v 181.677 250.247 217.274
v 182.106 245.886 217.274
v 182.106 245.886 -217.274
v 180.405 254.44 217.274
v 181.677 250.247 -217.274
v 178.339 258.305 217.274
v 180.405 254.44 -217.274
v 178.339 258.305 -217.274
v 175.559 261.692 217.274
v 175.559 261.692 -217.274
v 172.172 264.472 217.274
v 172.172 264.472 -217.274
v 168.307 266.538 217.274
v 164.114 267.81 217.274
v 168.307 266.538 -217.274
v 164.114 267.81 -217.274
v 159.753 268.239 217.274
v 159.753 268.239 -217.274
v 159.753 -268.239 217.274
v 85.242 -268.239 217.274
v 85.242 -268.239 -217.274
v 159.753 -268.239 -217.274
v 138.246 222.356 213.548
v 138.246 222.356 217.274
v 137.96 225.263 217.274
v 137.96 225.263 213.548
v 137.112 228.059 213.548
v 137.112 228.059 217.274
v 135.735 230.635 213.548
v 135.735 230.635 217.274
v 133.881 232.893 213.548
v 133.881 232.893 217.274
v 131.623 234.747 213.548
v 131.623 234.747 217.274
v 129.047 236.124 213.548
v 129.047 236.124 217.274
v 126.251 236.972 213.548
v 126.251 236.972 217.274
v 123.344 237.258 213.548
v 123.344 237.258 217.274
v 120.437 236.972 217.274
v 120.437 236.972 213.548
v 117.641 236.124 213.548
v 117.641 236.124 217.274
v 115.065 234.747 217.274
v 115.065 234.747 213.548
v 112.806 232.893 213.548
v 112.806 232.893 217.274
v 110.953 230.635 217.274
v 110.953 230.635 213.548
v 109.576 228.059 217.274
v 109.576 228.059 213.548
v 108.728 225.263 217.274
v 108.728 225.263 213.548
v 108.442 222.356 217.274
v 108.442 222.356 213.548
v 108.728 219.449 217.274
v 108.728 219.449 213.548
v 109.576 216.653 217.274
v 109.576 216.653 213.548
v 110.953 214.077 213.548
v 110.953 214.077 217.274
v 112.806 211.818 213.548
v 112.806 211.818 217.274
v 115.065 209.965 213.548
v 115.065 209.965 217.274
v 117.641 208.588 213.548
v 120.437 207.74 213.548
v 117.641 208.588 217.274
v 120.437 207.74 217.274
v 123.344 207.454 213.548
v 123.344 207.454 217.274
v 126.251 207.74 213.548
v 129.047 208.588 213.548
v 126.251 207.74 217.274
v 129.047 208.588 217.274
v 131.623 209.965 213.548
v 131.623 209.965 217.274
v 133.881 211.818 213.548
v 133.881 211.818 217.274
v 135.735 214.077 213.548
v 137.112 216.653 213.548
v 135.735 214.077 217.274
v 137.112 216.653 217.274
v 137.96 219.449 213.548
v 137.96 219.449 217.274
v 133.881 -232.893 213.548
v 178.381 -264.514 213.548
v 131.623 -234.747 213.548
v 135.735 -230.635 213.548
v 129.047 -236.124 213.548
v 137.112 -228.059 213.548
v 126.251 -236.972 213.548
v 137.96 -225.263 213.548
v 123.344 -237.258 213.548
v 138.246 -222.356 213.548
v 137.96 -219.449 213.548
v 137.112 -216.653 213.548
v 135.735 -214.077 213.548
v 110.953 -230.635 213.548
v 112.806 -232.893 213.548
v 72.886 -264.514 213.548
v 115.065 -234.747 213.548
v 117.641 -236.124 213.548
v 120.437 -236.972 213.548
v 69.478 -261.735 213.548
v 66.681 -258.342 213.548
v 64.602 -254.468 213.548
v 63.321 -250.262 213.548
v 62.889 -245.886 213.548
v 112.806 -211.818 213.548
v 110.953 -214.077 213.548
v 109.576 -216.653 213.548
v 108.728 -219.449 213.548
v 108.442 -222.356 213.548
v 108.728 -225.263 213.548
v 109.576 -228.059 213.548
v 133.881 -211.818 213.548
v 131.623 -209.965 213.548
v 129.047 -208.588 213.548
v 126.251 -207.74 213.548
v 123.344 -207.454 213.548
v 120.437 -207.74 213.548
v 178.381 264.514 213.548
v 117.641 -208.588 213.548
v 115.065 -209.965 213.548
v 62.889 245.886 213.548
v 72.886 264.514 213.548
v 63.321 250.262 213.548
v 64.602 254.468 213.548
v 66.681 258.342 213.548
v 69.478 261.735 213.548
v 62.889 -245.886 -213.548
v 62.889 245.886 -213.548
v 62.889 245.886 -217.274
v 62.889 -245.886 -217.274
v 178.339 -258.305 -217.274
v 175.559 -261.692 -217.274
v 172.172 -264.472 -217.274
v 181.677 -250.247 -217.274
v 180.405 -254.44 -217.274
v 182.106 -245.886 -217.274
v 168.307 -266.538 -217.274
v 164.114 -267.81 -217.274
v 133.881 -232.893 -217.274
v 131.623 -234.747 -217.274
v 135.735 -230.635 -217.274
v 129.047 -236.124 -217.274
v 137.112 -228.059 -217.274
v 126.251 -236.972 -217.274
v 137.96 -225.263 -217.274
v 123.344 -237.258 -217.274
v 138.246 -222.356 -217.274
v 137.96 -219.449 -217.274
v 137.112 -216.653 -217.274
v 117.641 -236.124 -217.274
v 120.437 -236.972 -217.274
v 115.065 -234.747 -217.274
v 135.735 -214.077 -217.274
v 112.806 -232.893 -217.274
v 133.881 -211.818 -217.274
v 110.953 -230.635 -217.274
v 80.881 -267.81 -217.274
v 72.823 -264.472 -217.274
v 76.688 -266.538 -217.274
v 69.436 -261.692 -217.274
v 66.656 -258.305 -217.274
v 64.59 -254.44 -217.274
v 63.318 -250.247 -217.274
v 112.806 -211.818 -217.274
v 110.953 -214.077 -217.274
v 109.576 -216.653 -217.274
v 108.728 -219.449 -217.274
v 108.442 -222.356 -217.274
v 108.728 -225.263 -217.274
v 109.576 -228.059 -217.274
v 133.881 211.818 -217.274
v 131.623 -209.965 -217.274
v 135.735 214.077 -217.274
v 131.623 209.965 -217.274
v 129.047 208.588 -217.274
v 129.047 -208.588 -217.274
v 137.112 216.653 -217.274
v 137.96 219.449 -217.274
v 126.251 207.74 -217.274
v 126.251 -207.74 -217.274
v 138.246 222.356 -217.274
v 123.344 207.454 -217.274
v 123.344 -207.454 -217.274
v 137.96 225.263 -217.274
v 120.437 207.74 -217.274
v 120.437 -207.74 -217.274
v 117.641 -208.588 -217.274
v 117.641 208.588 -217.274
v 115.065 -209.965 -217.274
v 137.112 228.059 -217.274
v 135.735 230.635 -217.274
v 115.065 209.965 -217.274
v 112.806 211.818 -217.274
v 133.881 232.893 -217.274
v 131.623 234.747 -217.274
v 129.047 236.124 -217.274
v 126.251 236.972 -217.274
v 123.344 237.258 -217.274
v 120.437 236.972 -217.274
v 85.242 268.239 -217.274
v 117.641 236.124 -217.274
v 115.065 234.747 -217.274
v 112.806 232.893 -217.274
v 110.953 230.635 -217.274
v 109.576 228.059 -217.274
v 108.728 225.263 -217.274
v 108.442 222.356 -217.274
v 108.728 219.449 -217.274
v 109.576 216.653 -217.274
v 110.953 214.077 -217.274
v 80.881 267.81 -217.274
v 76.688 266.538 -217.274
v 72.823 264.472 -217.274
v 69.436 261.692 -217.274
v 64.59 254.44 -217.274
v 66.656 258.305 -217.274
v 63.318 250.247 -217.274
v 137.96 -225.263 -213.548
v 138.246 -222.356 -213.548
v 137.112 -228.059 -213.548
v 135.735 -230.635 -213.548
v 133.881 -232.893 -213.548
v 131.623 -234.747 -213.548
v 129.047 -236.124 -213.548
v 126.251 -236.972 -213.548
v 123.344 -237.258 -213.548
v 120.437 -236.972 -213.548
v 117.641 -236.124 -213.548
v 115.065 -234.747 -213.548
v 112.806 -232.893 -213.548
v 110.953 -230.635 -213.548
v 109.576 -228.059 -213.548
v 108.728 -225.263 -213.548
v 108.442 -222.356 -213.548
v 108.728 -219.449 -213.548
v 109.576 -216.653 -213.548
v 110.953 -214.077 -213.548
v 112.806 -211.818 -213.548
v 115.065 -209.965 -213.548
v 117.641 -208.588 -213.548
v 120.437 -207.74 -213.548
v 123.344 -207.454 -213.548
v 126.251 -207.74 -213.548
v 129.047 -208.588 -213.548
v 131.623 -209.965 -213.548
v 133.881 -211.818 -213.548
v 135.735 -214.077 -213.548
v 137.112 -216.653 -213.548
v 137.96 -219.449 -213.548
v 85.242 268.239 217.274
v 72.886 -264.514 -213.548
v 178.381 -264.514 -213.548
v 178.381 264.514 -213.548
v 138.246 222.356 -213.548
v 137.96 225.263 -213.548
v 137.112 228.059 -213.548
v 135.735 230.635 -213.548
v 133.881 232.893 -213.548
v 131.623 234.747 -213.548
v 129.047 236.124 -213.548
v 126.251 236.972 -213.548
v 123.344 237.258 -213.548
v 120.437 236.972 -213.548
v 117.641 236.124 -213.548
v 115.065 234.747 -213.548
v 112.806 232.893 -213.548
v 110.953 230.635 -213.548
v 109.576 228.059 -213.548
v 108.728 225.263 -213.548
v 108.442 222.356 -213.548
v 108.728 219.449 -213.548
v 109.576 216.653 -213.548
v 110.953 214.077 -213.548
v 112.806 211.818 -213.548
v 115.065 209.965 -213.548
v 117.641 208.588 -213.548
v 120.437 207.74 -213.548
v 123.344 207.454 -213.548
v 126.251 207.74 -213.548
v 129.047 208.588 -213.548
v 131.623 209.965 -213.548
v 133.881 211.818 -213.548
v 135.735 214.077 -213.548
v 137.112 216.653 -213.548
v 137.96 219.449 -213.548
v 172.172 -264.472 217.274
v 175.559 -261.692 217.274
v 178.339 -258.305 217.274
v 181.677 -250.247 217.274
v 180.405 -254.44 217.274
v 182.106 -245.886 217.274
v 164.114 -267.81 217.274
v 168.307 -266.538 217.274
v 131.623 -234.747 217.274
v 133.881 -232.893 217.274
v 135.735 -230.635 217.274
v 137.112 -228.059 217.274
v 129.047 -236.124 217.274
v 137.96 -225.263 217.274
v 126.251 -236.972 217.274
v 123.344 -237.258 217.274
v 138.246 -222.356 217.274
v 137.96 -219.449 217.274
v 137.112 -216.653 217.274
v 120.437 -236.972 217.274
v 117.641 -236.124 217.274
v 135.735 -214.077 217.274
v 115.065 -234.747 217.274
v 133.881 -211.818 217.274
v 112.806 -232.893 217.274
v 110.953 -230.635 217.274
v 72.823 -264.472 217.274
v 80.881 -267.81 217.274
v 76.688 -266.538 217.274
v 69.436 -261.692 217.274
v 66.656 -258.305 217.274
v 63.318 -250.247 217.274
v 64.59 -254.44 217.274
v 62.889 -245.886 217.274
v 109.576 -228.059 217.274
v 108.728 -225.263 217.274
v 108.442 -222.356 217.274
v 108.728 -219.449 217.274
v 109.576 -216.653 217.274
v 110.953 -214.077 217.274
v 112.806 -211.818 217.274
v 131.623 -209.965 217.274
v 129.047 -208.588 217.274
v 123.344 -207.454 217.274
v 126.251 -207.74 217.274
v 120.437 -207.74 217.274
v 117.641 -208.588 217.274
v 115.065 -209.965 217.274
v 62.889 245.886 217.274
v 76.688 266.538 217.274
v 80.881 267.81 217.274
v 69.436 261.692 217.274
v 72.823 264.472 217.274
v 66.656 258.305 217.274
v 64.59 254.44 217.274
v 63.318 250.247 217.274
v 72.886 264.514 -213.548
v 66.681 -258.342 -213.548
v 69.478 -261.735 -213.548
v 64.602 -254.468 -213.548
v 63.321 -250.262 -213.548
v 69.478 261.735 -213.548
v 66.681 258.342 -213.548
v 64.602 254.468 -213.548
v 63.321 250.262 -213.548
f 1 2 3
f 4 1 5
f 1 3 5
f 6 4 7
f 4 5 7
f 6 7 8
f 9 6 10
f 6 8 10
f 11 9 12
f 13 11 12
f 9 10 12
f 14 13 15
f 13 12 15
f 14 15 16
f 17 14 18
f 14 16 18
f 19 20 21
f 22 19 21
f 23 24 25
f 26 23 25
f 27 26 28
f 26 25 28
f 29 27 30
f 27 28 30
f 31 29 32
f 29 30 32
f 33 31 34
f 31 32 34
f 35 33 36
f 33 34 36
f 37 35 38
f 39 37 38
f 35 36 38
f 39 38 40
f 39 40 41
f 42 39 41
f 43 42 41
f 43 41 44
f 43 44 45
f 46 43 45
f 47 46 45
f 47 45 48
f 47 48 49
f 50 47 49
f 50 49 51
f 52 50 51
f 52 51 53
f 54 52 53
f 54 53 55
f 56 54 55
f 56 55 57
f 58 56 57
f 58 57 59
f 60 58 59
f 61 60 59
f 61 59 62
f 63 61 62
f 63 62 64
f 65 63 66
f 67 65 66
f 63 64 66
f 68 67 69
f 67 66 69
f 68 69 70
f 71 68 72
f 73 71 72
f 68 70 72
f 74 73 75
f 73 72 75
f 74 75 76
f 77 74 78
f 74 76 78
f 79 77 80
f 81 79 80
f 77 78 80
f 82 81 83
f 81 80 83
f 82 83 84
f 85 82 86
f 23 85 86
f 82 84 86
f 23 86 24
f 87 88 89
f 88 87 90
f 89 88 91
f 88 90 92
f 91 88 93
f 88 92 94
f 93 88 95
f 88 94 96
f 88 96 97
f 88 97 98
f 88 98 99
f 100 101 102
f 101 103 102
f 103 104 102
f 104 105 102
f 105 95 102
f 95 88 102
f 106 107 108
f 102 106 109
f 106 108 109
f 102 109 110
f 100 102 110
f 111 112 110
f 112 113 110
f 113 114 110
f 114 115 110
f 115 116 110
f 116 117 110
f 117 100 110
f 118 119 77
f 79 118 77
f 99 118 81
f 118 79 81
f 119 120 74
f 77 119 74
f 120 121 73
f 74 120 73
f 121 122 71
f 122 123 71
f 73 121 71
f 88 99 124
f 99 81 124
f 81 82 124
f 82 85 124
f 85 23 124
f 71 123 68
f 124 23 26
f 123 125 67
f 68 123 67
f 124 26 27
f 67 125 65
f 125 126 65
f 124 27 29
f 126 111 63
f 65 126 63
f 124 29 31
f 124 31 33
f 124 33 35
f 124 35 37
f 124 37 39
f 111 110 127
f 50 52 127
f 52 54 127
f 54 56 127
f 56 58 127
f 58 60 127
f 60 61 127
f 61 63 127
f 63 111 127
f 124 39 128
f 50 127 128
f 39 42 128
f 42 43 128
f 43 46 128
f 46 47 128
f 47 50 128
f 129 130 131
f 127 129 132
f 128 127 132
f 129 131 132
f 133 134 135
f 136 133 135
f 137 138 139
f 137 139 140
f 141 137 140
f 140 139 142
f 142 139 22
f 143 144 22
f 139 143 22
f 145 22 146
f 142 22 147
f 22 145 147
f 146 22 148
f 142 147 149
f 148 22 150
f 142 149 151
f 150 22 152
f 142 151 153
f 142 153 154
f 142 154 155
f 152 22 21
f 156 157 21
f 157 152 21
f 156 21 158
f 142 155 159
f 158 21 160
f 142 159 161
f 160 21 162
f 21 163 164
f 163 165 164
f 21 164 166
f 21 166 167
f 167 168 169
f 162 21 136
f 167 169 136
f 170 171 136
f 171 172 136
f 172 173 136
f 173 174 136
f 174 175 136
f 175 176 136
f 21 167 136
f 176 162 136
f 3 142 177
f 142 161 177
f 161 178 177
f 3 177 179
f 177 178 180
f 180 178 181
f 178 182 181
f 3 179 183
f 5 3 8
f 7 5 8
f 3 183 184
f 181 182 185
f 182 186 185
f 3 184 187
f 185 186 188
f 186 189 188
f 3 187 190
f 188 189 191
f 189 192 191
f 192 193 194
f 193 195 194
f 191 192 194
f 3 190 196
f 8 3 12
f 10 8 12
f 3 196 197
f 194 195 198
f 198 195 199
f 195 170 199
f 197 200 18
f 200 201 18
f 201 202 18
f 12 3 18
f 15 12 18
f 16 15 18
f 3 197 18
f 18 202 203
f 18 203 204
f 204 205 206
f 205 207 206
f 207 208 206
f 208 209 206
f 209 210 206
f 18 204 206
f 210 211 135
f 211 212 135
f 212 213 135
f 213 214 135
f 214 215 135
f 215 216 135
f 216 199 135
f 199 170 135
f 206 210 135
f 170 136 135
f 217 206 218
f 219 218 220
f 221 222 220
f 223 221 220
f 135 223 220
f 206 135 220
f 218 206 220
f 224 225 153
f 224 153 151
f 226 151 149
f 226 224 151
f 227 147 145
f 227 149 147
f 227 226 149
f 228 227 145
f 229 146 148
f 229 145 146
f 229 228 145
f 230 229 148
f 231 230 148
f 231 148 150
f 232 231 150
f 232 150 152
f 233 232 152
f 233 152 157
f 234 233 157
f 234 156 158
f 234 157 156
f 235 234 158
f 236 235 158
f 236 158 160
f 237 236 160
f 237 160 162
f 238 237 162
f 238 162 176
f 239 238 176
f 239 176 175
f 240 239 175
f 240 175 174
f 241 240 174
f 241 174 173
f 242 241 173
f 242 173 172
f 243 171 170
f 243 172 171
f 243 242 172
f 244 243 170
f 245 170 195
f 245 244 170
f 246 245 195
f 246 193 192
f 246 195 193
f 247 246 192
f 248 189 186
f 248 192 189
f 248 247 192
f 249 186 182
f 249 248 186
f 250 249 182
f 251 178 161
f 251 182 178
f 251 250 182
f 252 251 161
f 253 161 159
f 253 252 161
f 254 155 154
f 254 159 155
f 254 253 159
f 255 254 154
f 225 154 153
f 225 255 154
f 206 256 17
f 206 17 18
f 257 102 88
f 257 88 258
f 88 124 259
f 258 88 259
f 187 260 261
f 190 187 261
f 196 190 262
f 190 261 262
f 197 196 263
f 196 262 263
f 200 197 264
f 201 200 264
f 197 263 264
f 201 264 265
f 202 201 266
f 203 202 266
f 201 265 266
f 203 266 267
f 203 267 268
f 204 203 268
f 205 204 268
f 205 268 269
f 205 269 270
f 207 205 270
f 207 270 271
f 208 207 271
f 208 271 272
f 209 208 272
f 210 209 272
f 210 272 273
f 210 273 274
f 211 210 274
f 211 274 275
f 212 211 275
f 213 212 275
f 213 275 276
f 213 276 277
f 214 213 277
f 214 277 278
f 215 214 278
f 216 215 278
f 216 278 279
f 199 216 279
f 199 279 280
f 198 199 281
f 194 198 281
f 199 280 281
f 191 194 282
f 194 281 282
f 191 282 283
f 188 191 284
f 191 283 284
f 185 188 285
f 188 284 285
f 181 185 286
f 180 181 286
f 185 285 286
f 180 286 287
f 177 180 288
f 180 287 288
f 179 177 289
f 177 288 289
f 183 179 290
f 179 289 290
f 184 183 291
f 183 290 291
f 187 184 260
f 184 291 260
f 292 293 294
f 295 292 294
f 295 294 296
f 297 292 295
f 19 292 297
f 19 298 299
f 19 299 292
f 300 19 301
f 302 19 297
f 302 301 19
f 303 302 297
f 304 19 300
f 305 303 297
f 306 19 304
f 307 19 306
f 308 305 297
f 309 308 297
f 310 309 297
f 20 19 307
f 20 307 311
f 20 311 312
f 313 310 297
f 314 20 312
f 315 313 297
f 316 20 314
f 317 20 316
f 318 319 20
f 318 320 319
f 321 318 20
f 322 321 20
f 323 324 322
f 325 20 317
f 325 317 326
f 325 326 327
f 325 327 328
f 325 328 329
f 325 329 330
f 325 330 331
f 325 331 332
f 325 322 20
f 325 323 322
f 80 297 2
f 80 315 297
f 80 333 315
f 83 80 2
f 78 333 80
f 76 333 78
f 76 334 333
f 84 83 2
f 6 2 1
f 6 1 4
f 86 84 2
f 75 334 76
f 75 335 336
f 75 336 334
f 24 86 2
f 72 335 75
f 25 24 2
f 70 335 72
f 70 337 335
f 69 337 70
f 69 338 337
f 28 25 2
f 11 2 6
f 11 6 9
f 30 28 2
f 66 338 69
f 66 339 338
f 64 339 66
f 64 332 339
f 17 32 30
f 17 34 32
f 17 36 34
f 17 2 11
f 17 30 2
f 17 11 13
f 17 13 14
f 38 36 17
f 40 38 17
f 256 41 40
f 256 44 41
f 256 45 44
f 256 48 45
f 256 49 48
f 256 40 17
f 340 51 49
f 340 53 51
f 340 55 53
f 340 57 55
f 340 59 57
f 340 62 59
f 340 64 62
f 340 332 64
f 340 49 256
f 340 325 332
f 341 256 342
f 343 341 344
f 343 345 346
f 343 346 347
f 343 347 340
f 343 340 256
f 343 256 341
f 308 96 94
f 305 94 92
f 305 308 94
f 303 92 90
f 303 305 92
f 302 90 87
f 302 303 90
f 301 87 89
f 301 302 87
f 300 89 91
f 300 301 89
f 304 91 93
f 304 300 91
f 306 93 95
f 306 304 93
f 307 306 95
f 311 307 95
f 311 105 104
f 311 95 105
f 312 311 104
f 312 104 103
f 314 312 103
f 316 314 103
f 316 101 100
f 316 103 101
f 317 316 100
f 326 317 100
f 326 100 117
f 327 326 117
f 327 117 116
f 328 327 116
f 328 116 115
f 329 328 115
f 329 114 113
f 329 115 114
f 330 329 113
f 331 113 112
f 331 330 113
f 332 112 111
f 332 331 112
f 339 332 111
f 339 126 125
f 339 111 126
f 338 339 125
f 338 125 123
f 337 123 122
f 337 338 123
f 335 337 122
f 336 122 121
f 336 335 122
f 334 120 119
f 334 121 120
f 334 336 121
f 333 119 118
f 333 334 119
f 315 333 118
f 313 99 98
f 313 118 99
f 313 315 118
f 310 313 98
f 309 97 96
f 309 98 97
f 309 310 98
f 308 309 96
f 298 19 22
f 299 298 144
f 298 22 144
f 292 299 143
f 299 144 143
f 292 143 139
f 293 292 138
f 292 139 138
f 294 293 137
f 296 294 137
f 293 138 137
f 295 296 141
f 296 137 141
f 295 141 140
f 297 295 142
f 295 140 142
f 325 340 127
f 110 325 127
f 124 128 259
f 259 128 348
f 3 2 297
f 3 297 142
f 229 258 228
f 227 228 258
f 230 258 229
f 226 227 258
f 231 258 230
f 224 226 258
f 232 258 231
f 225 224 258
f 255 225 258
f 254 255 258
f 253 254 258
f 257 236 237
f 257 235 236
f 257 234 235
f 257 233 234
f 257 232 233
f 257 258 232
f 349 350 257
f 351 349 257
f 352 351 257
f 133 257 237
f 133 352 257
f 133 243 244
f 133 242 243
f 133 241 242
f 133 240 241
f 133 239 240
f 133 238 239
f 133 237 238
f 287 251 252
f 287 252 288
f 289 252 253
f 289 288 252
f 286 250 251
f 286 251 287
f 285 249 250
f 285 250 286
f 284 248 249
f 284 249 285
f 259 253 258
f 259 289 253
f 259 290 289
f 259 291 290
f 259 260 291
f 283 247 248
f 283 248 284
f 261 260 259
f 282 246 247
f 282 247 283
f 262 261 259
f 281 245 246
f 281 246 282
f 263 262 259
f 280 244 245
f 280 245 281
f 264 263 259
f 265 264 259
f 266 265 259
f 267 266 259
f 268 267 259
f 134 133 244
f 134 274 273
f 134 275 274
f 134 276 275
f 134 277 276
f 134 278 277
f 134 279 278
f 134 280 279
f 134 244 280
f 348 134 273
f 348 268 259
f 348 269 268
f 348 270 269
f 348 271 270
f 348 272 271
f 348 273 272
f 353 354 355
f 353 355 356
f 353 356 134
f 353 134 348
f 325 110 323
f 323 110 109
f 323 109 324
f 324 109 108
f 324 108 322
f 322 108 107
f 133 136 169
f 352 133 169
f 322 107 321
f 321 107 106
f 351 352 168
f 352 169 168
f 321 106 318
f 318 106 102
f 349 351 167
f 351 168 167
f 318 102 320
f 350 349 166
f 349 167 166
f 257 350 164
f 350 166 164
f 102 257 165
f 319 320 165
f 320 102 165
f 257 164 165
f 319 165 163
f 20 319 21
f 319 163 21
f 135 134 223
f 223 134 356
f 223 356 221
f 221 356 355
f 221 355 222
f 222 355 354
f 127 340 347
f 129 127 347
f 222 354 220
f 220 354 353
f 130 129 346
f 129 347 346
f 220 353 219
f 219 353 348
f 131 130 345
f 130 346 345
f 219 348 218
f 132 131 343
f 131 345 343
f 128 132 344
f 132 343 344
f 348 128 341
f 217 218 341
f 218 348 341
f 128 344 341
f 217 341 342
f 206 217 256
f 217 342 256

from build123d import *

# Parameters (mm, degrees)
SKETCH1_W           = 740.664
SKETCH1_H           = 914.4
BOSS_EXTRUDE1_DEPTH = 203.2
SHELL1_T            = -6.35
SKETCH4_R           = 25.4
CUT_EXTRUDE1_DEPTH  = 853.694
FILLET1_R           = 38.1
SCALE1_SCALE        = 0.5867


with BuildPart() as part:
    # Sketch1 → Boss-Extrude1 (new body)
    with BuildSketch(Plane(origin=(0, 0, 0), x_dir=(0, 0, -1), z_dir=(1, 0, 0))):
        Rectangle(SKETCH1_W, SKETCH1_H)
    extrude(amount=BOSS_EXTRUDE1_DEPTH)

    # Shell1
    shell1_openings = [part.faces().sort_by_distance(p)[0] for p in [
        (0, 0, 0),
    ]]
    offset(amount=SHELL1_T, openings=shell1_openings, kind=Kind.INTERSECTION)

    # Sketch4 → Cut-Extrude1 (cut)
    with BuildSketch(Plane.XY.offset(370.332)):
        with Locations((103.042772695, 378.994204807)):
            Circle(SKETCH4_R)
    cut_extrude1 = extrude(amount=-CUT_EXTRUDE1_DEPTH, mode=Mode.SUBTRACT)

    # Mirror1: Cut-Extrude1 across plane
    add(cut_extrude1.mirror(Plane.ZX), mode=Mode.SUBTRACT)

    # Fillet1
    fillet1_edges = [part.edges().sort_by_distance(p)[0] for p in [
        (203.2, -457.2, 0),
    ]]
    fillet(fillet1_edges, radius=FILLET1_R)
    fillet1_2_edges = [part.edges().sort_by_distance(p)[0] for p in [
        (203.2, 457.2, 0),
    ]]
    fillet(fillet1_2_edges, radius=FILLET1_R)
    # the kernel refuses this fillet: 38.1 mm, written as the material it takes off along each edge
    with BuildSketch(Plane(origin=(0, -457.2, -465.582), x_dir=(1, 0, 0), z_dir=(0, 0, 1))) as fillet1_3_piece_1:
        with BuildLine():
            CenterArc((FILLET1_R, FILLET1_R), FILLET1_R, 180, 90)
            Line((0, FILLET1_R), (-FILLET1_R * 0.02, FILLET1_R))
            Line((-FILLET1_R * 0.02, FILLET1_R), (-FILLET1_R * 0.02, -FILLET1_R * 0.02))
            Line((-FILLET1_R * 0.02, -FILLET1_R * 0.02), (FILLET1_R, -FILLET1_R * 0.02))
            Line((FILLET1_R, -FILLET1_R * 0.02), (FILLET1_R, 0))
        make_face()
    extrude(amount=931.164, mode=Mode.SUBTRACT)
    # the kernel refuses this fillet: 38.1 mm, written as the material it takes off along each edge
    with BuildSketch(Plane(origin=(0, 457.2, 465.582), x_dir=(1, 0, 0), z_dir=(0, 0, -1))) as fillet1_4_piece_1:
        with BuildLine():
            CenterArc((FILLET1_R, FILLET1_R), FILLET1_R, 180, 90)
            Line((0, FILLET1_R), (-FILLET1_R * 0.02, FILLET1_R))
            Line((-FILLET1_R * 0.02, FILLET1_R), (-FILLET1_R * 0.02, -FILLET1_R * 0.02))
            Line((-FILLET1_R * 0.02, -FILLET1_R * 0.02), (FILLET1_R, -FILLET1_R * 0.02))
            Line((FILLET1_R, -FILLET1_R * 0.02), (FILLET1_R, 0))
        make_face()
    extrude(amount=931.164, mode=Mode.SUBTRACT)


with BuildPart() as part_1:
    # Scale1: scaled about (152.162233958, 0, 0)
    add(part.part.scale(SCALE1_SCALE).moved(Location((62.888651295, 0, 0))))


solid = part_1.part
